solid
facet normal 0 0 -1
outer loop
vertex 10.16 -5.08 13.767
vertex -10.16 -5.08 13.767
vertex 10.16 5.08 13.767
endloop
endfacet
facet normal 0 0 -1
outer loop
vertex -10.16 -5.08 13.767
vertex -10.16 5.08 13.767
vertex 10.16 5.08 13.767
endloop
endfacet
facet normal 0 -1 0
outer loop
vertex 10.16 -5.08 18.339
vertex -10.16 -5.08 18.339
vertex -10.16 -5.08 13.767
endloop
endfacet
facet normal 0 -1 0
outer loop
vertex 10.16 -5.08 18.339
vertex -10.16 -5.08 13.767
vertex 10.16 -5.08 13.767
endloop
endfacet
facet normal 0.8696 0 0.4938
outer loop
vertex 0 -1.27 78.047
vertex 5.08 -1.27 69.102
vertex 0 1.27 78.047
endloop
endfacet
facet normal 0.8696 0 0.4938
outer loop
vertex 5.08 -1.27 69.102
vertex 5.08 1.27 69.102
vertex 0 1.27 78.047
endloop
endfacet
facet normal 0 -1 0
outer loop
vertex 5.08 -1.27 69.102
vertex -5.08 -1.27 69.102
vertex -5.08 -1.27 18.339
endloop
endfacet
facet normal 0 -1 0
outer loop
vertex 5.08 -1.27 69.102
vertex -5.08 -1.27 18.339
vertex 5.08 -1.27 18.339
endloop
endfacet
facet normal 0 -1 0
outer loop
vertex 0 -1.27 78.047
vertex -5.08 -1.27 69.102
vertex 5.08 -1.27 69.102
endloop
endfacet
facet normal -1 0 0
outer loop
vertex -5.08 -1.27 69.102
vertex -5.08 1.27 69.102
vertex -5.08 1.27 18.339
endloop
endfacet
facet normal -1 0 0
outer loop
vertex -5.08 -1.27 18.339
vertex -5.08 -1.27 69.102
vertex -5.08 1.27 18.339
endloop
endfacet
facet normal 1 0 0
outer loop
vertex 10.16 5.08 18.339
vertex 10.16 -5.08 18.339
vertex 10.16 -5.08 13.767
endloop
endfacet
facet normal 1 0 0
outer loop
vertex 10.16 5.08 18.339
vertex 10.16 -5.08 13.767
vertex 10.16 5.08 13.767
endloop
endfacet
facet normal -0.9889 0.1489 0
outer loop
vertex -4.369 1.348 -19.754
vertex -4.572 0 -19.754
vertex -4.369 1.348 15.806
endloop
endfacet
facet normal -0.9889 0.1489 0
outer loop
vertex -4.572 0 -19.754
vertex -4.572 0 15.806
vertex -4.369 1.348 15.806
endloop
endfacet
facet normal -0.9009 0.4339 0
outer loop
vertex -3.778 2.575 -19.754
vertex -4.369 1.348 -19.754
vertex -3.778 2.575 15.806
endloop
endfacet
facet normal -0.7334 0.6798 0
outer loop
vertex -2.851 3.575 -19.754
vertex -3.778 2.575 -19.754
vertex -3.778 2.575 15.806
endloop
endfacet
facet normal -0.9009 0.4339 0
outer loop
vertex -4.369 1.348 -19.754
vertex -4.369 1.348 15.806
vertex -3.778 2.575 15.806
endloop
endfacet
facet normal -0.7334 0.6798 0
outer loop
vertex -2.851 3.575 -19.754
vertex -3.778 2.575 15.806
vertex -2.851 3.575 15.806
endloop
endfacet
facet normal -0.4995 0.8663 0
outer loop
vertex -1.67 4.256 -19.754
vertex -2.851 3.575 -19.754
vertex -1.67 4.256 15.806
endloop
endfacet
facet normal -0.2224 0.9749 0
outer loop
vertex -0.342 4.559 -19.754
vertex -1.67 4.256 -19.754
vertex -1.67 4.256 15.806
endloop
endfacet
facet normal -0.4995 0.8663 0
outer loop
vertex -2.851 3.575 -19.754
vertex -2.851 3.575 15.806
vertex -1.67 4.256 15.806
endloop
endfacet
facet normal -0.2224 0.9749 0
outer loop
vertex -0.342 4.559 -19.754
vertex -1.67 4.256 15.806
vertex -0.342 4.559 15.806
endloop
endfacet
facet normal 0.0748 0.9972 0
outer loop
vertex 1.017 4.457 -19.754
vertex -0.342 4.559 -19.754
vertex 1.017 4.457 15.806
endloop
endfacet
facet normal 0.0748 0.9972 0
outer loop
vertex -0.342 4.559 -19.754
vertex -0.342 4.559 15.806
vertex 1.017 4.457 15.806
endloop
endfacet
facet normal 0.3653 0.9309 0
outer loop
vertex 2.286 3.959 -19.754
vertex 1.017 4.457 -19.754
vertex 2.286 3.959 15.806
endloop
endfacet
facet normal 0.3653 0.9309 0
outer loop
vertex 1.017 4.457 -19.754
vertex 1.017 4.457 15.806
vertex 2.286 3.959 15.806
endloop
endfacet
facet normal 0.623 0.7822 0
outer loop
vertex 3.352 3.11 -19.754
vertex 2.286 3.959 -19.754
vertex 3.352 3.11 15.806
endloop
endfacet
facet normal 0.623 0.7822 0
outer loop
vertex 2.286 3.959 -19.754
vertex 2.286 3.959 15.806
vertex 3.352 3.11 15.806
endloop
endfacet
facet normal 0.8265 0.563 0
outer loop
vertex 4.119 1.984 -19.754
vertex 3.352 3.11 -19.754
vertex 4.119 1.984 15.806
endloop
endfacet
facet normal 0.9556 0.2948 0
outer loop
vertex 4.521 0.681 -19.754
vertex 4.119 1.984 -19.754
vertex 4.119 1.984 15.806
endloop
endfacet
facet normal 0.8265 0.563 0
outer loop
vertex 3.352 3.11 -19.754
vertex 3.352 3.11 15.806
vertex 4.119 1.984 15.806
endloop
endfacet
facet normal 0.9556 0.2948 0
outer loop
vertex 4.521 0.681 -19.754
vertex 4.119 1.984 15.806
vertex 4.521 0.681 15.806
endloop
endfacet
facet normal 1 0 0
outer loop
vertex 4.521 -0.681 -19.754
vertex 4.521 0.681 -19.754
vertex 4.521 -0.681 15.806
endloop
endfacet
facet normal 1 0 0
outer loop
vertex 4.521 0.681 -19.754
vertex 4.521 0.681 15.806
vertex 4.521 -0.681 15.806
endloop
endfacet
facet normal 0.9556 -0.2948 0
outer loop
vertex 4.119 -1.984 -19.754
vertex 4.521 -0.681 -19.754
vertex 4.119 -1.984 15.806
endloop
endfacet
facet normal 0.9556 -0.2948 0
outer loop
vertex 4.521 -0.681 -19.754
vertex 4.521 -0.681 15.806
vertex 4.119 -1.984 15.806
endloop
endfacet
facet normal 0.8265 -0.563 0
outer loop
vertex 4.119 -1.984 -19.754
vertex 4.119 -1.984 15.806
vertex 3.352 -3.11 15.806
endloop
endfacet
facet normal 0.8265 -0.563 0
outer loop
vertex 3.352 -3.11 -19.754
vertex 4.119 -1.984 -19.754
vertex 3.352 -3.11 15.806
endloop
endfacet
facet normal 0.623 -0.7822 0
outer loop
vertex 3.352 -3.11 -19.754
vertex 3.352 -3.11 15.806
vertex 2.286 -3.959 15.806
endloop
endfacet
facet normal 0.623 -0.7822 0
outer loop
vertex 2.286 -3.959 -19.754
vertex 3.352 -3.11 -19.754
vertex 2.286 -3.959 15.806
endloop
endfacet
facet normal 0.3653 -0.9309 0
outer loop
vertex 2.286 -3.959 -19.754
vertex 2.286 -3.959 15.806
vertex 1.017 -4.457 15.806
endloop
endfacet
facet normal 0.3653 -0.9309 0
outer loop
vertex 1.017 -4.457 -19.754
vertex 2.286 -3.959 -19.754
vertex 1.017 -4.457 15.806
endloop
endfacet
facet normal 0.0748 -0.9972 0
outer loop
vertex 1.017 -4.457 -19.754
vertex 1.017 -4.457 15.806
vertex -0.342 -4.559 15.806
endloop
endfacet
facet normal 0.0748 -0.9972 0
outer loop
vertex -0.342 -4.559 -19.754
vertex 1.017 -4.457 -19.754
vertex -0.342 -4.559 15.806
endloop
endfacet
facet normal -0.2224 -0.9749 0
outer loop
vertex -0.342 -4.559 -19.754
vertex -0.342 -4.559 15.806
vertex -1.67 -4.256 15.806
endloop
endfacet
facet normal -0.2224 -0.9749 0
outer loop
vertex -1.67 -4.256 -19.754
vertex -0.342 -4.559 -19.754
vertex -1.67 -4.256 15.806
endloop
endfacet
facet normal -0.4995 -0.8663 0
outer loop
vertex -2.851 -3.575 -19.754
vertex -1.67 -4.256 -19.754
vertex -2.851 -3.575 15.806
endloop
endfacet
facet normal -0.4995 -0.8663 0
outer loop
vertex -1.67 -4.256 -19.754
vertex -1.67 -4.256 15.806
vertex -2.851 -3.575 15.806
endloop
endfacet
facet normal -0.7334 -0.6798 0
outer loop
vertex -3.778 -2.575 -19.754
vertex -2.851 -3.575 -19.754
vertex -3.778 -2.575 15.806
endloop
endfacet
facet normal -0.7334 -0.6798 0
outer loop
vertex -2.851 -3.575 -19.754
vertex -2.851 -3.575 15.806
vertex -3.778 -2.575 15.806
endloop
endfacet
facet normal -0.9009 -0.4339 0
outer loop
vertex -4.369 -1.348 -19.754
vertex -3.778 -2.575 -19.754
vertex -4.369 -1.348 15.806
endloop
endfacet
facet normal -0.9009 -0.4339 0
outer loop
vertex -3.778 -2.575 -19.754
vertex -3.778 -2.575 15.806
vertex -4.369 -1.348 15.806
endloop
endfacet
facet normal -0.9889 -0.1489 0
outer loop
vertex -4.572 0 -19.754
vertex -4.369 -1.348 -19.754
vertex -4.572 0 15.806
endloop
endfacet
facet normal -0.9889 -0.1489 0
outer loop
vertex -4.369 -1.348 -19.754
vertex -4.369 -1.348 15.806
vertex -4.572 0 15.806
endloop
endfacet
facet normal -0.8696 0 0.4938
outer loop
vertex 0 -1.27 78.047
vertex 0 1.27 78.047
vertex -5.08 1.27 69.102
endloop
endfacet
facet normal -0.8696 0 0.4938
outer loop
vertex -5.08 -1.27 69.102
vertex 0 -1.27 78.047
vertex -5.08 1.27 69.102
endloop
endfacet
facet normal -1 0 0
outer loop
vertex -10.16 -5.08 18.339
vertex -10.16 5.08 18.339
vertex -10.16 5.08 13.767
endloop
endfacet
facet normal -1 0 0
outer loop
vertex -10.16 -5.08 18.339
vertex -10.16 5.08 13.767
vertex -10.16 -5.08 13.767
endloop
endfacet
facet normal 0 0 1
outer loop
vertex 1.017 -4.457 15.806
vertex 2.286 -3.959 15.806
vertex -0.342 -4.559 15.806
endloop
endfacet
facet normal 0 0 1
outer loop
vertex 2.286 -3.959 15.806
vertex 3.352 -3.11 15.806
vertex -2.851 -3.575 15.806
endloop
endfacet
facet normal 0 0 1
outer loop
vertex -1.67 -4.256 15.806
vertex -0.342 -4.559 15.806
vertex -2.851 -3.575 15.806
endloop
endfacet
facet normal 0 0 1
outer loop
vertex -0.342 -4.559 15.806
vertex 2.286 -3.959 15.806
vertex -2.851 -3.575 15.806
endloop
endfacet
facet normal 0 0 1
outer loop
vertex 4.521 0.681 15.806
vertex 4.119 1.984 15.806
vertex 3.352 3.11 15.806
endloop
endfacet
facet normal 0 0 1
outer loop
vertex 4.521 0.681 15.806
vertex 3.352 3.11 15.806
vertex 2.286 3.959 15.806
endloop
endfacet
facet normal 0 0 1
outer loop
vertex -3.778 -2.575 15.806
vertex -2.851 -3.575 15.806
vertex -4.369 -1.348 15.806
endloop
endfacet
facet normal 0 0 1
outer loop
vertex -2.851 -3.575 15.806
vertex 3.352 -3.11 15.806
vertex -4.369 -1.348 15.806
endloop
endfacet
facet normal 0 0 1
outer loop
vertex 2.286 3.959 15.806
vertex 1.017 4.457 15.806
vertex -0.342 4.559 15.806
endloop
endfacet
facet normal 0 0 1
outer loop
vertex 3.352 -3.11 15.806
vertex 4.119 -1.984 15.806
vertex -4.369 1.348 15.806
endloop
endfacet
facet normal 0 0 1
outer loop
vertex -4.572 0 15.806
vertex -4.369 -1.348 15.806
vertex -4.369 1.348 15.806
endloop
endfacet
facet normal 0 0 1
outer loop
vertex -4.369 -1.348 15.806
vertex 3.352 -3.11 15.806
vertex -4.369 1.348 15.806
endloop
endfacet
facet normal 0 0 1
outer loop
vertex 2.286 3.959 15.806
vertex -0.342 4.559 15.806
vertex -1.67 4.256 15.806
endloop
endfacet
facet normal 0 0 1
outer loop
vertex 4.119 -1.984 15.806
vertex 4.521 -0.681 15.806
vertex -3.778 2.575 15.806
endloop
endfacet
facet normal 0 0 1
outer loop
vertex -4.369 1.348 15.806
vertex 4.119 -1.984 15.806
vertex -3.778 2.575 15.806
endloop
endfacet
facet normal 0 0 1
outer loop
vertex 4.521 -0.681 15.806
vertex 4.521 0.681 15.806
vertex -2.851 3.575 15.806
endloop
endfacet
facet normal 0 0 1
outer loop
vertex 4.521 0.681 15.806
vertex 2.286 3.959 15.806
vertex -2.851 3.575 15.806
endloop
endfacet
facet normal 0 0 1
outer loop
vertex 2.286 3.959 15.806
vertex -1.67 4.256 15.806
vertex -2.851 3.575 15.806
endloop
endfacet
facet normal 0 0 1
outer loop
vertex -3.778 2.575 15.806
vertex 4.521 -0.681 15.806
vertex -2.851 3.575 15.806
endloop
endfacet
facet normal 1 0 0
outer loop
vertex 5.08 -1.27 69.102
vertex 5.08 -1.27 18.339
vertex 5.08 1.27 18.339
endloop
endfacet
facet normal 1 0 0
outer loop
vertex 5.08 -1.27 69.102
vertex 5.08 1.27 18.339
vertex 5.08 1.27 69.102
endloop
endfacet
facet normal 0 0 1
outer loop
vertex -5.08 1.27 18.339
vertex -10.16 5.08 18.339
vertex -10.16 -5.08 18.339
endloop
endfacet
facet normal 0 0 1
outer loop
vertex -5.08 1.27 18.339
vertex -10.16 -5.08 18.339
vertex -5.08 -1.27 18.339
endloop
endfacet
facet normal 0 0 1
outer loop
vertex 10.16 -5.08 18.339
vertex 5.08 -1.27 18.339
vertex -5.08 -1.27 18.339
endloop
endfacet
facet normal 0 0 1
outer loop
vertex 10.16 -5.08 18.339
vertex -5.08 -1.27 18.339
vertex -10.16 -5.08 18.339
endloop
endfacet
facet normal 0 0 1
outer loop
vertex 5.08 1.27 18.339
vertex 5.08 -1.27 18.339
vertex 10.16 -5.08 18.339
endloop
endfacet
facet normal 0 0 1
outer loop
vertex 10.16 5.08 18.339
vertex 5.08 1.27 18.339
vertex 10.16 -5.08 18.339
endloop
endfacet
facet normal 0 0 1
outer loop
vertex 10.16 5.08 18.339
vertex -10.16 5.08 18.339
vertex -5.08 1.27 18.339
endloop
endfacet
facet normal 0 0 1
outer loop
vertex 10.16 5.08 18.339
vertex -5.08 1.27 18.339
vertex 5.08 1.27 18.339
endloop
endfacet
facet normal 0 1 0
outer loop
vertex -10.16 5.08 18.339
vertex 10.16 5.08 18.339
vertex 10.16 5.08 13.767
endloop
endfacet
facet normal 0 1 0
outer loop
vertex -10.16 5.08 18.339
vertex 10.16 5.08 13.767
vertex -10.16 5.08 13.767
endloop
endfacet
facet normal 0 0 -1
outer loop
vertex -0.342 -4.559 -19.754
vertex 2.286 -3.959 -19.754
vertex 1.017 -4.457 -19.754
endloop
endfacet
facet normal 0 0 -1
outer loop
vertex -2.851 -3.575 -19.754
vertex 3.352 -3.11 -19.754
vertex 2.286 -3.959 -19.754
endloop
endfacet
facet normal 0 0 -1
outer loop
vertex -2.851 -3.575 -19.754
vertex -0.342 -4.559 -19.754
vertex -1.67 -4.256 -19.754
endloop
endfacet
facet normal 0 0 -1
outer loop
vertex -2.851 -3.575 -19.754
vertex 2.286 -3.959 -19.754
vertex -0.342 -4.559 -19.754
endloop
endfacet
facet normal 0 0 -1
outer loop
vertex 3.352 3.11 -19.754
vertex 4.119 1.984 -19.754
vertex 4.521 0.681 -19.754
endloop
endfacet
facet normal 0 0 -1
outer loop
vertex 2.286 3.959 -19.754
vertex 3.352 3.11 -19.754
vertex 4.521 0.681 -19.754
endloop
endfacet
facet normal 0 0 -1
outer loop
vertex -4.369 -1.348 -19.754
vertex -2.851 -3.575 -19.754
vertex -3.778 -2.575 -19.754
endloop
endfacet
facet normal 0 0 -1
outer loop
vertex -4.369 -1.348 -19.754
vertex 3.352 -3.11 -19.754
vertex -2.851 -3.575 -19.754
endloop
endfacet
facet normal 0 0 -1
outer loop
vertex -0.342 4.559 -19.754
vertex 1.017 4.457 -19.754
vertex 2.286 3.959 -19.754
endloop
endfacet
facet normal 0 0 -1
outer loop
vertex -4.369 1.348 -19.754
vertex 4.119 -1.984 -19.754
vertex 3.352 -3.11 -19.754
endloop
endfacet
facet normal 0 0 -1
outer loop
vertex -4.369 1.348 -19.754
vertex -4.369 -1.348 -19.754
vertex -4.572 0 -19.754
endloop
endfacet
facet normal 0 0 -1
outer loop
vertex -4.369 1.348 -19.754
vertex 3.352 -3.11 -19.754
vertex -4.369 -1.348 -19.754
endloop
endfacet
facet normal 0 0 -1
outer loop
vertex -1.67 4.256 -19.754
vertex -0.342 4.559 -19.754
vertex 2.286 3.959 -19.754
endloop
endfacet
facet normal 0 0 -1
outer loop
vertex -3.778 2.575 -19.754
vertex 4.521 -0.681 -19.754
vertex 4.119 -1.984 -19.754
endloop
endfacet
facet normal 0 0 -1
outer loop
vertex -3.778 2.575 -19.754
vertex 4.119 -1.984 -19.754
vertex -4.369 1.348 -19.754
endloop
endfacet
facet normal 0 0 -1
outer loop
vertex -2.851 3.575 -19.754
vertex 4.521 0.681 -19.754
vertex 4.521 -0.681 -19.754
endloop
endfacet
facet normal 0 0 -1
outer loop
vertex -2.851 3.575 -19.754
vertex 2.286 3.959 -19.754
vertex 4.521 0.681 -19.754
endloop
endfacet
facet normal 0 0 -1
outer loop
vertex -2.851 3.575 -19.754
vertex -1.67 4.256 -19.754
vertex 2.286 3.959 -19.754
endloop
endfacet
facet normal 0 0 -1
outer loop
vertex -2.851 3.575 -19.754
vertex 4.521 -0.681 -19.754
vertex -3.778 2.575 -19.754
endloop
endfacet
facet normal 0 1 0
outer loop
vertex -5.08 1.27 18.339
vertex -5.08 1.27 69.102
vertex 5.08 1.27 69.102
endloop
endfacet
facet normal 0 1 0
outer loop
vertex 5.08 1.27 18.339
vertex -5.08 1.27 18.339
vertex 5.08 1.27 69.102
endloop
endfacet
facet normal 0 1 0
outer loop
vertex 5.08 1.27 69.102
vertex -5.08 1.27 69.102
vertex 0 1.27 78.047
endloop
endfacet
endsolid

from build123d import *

# Parameters (mm, degrees)
F0_W     = 4.572
F0_H     = 35.56
F3_W     = 10.16
F3_H     = 5.08
F4_DEPTH = 4.572
F6_DEPTH = 1.27
F7_DEPTH = 1.27


with BuildPart() as f1:
    # F0 (on Front) → F1 (revolve)
    with BuildSketch(Plane.XZ):
        with Locations((-2.286, -1.974411)):
            Rectangle(F0_W, F0_H)
    revolve(axis=Axis((0, 0, -1.974411), (0, 0, -1)))


with BuildPart() as f4:
    # F3 (on offset) → F4 (new body)
    with BuildSketch(Plane.XY.offset(18.3388)):
        with Locations((-5.08, -2.54)):
            Rectangle(F3_W, F3_H)
        with Locations((5.08, -2.54)):
            Rectangle(F3_W, F3_H)
        with Locations((-5.08, 2.54)):
            Rectangle(F3_W, F3_H)
        with Locations((5.08, 2.54)):
            Rectangle(F3_W, F3_H)
    extrude(amount=-F4_DEPTH)

    # F5 (on Front) → F6 (join)
    with BuildSketch(Plane.XZ):
        Polygon((-5.08, 18.301688), (0, 18.301688), (5.08, 18.301688), (5.08, 69.101688), (0, 78.046853), (-5.08, 69.101688), align=None)
    extrude(amount=-F6_DEPTH)

    # F5 (on Front) → F7 (join)
    with BuildSketch(Plane.XZ):
        Polygon((-5.08, 18.301688), (0, 18.301688), (5.08, 18.301688), (5.08, 69.101688), (0, 78.046853), (-5.08, 69.101688), align=None)
    extrude(amount=F7_DEPTH)


solid = Compound([f1.part, f4.part])
